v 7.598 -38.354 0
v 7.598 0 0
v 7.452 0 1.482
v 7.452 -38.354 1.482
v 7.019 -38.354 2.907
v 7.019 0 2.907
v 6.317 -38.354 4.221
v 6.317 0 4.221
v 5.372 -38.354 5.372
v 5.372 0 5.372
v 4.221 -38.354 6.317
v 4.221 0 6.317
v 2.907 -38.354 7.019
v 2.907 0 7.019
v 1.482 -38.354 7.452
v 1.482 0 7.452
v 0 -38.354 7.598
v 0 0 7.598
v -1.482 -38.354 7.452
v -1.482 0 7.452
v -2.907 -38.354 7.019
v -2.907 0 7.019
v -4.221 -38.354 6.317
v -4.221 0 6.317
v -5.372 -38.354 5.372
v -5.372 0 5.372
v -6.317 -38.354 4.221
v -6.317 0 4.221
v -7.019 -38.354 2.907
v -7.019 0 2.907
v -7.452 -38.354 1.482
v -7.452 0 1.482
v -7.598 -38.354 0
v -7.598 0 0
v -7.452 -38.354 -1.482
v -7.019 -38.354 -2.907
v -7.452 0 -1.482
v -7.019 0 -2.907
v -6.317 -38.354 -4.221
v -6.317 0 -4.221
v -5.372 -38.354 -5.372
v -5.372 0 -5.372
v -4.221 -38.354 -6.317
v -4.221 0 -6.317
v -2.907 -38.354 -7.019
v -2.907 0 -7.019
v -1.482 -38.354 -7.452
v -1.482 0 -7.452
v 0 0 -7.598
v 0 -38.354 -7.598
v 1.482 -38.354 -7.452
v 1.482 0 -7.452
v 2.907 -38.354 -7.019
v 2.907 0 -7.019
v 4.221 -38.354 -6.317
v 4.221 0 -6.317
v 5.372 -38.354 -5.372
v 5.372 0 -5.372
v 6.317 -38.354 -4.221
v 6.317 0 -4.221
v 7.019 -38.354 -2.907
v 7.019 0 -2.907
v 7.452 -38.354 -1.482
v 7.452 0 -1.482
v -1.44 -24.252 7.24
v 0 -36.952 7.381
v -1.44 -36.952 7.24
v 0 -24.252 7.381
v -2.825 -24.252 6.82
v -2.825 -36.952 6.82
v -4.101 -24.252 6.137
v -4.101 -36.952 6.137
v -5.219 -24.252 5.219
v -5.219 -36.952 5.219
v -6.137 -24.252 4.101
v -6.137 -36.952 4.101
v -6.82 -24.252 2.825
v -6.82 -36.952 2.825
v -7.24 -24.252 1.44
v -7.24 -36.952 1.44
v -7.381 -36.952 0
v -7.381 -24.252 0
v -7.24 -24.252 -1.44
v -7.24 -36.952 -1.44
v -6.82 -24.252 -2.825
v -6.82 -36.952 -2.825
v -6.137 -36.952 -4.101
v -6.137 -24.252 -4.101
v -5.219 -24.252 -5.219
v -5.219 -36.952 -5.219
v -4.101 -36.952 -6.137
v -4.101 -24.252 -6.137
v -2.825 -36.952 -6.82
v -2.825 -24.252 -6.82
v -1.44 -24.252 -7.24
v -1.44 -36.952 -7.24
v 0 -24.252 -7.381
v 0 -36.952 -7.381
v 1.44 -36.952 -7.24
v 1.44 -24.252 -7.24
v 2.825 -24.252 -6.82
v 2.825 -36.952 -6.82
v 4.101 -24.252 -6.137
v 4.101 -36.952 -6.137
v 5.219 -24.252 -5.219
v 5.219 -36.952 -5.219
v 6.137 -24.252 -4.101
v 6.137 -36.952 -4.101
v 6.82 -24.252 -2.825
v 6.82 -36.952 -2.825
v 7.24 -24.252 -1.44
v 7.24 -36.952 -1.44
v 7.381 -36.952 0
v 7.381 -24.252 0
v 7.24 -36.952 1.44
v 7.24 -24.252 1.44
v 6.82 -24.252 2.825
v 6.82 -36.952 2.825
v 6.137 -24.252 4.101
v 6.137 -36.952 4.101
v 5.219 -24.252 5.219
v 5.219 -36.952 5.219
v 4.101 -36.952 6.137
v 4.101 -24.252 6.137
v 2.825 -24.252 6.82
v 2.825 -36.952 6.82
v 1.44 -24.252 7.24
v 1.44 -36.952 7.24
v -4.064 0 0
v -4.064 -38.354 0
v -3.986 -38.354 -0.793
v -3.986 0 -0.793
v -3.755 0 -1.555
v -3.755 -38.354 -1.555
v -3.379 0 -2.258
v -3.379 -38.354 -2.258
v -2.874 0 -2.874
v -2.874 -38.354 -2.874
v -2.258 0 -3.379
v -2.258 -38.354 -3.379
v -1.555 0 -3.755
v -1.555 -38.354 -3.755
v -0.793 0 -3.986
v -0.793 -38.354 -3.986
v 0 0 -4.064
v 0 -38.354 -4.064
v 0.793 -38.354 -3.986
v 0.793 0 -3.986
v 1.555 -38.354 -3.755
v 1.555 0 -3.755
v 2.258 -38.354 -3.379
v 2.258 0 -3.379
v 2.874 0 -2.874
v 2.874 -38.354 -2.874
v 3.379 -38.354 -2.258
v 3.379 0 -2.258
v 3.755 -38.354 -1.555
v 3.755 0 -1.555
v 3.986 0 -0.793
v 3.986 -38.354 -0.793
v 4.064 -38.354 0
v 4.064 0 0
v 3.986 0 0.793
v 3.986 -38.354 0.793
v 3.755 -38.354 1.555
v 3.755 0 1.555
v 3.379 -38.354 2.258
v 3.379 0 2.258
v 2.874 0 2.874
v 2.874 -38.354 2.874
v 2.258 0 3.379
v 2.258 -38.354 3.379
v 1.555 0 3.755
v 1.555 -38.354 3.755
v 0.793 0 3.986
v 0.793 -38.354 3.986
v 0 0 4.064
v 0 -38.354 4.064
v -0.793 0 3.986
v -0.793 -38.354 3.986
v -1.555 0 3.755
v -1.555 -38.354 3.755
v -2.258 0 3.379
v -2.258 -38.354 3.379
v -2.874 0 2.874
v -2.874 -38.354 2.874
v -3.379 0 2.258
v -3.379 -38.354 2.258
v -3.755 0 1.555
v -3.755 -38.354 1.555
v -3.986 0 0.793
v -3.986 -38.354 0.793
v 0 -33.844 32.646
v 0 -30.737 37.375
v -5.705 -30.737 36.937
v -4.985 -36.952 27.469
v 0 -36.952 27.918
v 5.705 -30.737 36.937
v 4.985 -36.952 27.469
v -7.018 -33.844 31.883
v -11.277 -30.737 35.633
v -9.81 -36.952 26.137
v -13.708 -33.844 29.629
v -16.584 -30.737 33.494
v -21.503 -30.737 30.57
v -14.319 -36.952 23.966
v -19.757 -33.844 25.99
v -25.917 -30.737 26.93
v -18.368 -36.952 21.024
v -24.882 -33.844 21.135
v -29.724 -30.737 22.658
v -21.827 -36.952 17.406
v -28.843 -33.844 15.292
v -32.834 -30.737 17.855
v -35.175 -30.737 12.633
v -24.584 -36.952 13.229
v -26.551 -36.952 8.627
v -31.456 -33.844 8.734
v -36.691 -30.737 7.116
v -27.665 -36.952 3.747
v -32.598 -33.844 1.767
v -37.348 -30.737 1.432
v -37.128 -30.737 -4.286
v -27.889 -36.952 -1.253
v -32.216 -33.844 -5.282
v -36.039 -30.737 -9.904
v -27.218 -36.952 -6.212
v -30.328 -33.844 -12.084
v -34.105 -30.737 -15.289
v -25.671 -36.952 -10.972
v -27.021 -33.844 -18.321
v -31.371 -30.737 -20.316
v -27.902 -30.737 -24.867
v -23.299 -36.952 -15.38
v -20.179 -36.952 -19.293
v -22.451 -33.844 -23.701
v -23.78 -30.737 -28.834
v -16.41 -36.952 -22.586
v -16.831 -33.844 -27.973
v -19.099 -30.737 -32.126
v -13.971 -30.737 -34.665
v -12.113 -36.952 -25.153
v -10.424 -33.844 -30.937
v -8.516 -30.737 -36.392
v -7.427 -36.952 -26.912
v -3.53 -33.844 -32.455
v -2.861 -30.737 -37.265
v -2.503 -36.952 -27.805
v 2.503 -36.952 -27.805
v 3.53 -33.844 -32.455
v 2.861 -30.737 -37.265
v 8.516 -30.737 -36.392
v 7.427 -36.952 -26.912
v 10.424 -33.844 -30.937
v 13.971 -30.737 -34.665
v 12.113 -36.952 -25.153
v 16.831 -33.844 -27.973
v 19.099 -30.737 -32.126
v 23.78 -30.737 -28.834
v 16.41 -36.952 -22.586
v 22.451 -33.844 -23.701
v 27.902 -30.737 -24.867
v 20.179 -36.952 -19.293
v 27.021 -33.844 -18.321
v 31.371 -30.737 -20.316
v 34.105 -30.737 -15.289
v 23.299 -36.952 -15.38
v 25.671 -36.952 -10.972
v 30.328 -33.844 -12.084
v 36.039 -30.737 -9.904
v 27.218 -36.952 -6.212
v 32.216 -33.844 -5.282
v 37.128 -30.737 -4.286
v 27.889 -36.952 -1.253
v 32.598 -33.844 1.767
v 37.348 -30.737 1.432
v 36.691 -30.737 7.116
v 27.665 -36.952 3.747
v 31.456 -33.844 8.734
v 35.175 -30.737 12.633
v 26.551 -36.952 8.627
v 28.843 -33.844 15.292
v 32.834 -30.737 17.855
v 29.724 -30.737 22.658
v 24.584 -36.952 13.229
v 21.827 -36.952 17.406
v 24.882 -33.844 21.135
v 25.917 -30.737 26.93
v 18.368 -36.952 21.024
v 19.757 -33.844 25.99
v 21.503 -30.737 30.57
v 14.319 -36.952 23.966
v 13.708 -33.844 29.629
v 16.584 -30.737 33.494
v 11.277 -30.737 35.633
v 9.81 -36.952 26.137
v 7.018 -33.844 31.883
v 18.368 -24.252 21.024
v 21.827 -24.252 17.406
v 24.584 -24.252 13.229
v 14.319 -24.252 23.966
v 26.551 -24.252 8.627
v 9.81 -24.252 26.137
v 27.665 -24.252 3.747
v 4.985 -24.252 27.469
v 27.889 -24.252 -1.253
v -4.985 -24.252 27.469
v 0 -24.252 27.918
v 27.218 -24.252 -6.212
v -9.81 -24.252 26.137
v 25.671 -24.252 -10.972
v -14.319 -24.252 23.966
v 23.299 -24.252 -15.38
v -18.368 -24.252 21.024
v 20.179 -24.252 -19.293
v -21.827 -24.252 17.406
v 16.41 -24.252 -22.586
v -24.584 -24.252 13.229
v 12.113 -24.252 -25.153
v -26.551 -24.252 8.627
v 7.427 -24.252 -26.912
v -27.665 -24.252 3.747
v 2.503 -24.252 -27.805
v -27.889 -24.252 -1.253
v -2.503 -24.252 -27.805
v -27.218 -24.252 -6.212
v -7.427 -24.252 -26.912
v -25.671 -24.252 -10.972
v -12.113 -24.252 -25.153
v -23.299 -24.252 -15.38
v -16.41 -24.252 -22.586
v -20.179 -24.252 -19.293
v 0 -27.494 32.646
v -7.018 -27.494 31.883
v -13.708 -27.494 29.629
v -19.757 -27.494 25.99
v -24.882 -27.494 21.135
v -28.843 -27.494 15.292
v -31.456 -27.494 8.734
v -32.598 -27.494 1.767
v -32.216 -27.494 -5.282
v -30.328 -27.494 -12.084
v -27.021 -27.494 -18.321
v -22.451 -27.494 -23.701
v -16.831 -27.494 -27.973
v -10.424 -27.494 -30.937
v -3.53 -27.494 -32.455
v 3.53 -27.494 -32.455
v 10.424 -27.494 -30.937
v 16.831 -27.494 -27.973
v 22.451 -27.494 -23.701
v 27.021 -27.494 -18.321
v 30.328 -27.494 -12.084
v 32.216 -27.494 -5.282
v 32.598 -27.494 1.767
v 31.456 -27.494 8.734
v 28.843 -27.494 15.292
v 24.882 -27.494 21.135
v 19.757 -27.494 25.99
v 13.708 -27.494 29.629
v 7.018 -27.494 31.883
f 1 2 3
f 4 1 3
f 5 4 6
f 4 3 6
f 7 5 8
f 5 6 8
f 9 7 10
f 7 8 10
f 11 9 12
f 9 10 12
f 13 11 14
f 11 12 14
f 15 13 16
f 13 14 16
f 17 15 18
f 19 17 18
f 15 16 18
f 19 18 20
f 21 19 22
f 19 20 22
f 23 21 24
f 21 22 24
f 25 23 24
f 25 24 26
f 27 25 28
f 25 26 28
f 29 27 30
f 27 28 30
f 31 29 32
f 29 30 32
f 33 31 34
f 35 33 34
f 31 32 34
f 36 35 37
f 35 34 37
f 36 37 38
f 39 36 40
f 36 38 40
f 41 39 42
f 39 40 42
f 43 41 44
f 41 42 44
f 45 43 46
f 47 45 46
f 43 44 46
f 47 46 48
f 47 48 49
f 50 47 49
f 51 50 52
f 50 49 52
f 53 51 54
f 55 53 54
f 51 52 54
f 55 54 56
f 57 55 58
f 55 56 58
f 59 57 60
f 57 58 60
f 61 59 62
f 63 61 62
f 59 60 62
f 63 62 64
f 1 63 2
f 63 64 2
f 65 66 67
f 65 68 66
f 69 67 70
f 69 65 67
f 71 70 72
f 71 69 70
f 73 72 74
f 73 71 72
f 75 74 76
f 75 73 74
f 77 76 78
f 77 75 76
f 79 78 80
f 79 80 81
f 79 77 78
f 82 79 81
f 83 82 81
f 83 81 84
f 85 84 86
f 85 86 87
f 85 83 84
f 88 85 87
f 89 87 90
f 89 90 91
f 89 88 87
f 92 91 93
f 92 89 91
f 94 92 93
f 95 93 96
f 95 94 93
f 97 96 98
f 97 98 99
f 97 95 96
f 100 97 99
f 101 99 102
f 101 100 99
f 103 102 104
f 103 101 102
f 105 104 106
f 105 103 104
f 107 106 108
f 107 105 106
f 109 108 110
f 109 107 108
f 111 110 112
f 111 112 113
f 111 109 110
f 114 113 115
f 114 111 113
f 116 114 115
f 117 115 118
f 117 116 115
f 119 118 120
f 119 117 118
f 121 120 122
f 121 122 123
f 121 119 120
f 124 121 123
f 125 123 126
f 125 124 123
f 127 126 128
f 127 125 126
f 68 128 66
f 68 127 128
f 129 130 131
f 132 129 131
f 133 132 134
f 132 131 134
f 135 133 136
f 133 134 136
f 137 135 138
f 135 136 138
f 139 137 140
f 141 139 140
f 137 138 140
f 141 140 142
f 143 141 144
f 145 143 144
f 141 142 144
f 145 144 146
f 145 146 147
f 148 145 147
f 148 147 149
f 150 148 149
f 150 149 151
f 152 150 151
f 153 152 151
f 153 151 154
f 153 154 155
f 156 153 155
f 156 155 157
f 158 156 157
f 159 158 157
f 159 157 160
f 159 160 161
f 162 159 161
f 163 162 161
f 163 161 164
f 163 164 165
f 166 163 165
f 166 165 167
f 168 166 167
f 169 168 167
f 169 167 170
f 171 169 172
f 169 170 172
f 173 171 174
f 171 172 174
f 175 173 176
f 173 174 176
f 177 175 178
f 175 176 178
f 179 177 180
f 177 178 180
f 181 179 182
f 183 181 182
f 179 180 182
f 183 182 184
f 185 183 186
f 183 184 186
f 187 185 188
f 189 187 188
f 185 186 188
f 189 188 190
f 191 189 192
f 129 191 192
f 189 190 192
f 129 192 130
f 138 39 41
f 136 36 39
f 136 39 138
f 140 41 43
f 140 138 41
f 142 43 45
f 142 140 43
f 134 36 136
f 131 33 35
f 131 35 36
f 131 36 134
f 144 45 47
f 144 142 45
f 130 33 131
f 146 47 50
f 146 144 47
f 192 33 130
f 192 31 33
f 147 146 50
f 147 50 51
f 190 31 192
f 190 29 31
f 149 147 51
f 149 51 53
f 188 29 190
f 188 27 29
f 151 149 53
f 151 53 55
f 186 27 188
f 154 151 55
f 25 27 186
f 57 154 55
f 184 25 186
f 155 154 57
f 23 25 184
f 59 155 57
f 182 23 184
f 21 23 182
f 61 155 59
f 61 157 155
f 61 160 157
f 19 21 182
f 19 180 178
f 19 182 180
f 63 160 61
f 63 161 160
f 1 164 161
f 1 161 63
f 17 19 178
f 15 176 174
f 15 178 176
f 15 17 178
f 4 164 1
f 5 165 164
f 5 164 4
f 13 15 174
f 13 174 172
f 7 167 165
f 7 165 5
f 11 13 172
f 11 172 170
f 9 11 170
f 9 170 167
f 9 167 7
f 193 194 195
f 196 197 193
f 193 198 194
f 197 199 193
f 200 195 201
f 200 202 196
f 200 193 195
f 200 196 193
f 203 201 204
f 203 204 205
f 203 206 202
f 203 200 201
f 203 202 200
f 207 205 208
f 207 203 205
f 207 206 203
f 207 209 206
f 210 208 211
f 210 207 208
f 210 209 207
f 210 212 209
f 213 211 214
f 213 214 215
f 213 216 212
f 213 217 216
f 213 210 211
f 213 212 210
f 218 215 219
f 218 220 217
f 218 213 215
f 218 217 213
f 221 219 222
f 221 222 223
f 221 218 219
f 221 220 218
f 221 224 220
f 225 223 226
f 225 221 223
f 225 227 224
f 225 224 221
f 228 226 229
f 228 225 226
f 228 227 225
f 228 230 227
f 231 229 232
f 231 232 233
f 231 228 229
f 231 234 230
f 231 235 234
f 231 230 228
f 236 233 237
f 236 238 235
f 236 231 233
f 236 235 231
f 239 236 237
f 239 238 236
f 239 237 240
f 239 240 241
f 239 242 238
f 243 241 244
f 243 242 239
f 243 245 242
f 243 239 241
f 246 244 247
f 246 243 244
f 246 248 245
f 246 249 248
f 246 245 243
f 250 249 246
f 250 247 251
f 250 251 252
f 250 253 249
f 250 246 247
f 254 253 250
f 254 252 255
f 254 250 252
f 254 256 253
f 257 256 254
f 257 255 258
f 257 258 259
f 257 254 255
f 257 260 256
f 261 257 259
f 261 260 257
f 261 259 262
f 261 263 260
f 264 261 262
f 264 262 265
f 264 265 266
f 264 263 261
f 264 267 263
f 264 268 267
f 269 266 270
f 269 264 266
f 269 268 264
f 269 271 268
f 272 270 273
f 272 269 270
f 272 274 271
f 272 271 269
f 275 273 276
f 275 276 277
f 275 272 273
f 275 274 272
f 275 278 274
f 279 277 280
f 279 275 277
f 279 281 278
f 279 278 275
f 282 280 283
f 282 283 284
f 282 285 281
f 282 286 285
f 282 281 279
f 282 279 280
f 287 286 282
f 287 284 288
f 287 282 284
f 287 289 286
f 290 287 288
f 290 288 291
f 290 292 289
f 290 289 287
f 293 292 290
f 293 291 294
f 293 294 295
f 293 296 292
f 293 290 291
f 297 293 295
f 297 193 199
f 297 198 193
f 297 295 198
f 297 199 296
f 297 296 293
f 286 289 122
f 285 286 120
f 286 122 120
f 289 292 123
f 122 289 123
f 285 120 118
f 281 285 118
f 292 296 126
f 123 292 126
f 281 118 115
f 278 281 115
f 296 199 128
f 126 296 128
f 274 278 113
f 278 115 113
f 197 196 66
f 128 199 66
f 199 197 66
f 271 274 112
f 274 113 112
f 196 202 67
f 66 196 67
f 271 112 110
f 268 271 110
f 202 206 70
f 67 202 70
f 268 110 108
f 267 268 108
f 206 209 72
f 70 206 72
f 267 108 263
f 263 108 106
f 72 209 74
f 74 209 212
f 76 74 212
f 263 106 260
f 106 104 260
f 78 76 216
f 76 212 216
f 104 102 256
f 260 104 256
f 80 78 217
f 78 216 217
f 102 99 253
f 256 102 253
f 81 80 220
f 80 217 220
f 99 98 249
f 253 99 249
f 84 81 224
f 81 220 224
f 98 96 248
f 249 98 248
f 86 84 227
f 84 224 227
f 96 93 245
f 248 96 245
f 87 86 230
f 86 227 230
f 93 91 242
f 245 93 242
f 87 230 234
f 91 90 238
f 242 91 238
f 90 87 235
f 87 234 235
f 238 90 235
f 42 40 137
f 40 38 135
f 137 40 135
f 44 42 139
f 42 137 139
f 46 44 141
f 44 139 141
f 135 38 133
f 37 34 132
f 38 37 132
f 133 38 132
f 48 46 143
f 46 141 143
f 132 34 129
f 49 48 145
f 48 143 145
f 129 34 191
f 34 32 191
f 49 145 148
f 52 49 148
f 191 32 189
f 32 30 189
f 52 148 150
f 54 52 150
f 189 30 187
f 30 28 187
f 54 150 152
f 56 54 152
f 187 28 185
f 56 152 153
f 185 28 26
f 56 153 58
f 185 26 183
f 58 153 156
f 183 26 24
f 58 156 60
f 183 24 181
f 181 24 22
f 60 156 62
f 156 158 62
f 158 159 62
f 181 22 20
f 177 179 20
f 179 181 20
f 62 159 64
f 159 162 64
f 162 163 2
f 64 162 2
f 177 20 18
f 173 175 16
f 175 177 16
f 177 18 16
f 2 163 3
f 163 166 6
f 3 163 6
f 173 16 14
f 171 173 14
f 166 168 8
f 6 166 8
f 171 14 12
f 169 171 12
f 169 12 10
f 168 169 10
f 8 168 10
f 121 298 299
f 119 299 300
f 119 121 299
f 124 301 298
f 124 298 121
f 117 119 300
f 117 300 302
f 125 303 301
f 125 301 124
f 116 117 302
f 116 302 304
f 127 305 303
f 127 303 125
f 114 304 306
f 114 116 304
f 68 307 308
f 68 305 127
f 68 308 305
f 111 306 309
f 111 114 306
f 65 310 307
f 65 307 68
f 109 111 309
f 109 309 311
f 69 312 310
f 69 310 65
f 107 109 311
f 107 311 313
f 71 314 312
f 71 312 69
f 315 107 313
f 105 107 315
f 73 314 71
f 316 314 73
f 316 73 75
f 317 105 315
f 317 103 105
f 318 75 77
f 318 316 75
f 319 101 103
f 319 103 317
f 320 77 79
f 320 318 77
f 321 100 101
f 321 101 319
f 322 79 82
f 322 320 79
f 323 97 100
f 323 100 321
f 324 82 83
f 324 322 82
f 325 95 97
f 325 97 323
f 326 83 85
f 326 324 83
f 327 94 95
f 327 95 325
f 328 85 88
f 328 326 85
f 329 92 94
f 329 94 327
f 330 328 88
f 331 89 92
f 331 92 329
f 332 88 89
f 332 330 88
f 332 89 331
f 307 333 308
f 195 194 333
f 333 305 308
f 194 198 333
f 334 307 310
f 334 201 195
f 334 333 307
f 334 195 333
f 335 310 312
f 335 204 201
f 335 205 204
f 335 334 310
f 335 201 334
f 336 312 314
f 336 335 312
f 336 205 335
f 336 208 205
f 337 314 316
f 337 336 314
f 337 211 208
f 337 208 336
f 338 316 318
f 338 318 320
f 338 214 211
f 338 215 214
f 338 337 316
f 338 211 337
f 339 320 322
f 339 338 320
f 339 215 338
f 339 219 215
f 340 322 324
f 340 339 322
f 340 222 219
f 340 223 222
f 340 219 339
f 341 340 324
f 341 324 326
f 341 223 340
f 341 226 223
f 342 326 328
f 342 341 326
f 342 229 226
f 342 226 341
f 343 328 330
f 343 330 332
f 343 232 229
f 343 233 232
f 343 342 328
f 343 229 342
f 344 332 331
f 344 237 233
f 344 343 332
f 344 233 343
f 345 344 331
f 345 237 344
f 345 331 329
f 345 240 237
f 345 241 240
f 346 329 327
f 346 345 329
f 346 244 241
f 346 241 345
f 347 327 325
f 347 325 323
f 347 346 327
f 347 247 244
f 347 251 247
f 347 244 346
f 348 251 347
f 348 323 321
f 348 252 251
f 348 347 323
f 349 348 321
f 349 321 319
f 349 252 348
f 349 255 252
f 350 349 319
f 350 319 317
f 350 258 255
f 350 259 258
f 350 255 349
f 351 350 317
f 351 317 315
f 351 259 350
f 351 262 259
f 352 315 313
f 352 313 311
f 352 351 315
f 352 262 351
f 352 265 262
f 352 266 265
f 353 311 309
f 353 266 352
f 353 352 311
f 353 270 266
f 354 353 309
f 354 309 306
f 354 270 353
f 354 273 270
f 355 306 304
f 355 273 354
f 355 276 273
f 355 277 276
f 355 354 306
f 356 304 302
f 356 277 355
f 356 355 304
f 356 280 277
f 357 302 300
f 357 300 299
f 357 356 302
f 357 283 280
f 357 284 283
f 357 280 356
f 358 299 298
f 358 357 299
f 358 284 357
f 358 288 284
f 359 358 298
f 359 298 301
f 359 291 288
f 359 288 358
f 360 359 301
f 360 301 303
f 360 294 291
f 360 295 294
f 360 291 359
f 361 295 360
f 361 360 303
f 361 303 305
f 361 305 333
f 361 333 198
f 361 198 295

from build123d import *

# Parameters (mm, degrees)
F0_W     = 12.7
F0_H     = 20.536174
F2_R     = 7.5976
F3_DEPTH = 38.354
F5_D     = 8.128


with BuildPart() as f1:
    # F0 (on Right) → F1 (revolve)
    with BuildSketch(Plane.YZ):
        Polygon((-36.951599, 27.917587), (-24.251599, 27.917587), (-30.736707, 37.375033), align=None)
        with Locations((-30.601599, 17.6495)):
            Rectangle(F0_W, F0_H)
    revolve(axis=Axis((0, -24.285374, 0), (0, -1, 0)))


with BuildPart() as f3:
    # F2 (on Front) → F3 (new body)
    with BuildSketch(Plane.XZ):
        Circle(F2_R)
    extrude(amount=F3_DEPTH)

    # F5 (through all)
    with Locations(Plane(origin=(0, 0, 0), x_dir=(1, 0, 0), z_dir=(0, 1, 0))):
        with Locations((0, 0)):
            Hole(F5_D / 2)


solid = Compound([f1.part, f3.part])
